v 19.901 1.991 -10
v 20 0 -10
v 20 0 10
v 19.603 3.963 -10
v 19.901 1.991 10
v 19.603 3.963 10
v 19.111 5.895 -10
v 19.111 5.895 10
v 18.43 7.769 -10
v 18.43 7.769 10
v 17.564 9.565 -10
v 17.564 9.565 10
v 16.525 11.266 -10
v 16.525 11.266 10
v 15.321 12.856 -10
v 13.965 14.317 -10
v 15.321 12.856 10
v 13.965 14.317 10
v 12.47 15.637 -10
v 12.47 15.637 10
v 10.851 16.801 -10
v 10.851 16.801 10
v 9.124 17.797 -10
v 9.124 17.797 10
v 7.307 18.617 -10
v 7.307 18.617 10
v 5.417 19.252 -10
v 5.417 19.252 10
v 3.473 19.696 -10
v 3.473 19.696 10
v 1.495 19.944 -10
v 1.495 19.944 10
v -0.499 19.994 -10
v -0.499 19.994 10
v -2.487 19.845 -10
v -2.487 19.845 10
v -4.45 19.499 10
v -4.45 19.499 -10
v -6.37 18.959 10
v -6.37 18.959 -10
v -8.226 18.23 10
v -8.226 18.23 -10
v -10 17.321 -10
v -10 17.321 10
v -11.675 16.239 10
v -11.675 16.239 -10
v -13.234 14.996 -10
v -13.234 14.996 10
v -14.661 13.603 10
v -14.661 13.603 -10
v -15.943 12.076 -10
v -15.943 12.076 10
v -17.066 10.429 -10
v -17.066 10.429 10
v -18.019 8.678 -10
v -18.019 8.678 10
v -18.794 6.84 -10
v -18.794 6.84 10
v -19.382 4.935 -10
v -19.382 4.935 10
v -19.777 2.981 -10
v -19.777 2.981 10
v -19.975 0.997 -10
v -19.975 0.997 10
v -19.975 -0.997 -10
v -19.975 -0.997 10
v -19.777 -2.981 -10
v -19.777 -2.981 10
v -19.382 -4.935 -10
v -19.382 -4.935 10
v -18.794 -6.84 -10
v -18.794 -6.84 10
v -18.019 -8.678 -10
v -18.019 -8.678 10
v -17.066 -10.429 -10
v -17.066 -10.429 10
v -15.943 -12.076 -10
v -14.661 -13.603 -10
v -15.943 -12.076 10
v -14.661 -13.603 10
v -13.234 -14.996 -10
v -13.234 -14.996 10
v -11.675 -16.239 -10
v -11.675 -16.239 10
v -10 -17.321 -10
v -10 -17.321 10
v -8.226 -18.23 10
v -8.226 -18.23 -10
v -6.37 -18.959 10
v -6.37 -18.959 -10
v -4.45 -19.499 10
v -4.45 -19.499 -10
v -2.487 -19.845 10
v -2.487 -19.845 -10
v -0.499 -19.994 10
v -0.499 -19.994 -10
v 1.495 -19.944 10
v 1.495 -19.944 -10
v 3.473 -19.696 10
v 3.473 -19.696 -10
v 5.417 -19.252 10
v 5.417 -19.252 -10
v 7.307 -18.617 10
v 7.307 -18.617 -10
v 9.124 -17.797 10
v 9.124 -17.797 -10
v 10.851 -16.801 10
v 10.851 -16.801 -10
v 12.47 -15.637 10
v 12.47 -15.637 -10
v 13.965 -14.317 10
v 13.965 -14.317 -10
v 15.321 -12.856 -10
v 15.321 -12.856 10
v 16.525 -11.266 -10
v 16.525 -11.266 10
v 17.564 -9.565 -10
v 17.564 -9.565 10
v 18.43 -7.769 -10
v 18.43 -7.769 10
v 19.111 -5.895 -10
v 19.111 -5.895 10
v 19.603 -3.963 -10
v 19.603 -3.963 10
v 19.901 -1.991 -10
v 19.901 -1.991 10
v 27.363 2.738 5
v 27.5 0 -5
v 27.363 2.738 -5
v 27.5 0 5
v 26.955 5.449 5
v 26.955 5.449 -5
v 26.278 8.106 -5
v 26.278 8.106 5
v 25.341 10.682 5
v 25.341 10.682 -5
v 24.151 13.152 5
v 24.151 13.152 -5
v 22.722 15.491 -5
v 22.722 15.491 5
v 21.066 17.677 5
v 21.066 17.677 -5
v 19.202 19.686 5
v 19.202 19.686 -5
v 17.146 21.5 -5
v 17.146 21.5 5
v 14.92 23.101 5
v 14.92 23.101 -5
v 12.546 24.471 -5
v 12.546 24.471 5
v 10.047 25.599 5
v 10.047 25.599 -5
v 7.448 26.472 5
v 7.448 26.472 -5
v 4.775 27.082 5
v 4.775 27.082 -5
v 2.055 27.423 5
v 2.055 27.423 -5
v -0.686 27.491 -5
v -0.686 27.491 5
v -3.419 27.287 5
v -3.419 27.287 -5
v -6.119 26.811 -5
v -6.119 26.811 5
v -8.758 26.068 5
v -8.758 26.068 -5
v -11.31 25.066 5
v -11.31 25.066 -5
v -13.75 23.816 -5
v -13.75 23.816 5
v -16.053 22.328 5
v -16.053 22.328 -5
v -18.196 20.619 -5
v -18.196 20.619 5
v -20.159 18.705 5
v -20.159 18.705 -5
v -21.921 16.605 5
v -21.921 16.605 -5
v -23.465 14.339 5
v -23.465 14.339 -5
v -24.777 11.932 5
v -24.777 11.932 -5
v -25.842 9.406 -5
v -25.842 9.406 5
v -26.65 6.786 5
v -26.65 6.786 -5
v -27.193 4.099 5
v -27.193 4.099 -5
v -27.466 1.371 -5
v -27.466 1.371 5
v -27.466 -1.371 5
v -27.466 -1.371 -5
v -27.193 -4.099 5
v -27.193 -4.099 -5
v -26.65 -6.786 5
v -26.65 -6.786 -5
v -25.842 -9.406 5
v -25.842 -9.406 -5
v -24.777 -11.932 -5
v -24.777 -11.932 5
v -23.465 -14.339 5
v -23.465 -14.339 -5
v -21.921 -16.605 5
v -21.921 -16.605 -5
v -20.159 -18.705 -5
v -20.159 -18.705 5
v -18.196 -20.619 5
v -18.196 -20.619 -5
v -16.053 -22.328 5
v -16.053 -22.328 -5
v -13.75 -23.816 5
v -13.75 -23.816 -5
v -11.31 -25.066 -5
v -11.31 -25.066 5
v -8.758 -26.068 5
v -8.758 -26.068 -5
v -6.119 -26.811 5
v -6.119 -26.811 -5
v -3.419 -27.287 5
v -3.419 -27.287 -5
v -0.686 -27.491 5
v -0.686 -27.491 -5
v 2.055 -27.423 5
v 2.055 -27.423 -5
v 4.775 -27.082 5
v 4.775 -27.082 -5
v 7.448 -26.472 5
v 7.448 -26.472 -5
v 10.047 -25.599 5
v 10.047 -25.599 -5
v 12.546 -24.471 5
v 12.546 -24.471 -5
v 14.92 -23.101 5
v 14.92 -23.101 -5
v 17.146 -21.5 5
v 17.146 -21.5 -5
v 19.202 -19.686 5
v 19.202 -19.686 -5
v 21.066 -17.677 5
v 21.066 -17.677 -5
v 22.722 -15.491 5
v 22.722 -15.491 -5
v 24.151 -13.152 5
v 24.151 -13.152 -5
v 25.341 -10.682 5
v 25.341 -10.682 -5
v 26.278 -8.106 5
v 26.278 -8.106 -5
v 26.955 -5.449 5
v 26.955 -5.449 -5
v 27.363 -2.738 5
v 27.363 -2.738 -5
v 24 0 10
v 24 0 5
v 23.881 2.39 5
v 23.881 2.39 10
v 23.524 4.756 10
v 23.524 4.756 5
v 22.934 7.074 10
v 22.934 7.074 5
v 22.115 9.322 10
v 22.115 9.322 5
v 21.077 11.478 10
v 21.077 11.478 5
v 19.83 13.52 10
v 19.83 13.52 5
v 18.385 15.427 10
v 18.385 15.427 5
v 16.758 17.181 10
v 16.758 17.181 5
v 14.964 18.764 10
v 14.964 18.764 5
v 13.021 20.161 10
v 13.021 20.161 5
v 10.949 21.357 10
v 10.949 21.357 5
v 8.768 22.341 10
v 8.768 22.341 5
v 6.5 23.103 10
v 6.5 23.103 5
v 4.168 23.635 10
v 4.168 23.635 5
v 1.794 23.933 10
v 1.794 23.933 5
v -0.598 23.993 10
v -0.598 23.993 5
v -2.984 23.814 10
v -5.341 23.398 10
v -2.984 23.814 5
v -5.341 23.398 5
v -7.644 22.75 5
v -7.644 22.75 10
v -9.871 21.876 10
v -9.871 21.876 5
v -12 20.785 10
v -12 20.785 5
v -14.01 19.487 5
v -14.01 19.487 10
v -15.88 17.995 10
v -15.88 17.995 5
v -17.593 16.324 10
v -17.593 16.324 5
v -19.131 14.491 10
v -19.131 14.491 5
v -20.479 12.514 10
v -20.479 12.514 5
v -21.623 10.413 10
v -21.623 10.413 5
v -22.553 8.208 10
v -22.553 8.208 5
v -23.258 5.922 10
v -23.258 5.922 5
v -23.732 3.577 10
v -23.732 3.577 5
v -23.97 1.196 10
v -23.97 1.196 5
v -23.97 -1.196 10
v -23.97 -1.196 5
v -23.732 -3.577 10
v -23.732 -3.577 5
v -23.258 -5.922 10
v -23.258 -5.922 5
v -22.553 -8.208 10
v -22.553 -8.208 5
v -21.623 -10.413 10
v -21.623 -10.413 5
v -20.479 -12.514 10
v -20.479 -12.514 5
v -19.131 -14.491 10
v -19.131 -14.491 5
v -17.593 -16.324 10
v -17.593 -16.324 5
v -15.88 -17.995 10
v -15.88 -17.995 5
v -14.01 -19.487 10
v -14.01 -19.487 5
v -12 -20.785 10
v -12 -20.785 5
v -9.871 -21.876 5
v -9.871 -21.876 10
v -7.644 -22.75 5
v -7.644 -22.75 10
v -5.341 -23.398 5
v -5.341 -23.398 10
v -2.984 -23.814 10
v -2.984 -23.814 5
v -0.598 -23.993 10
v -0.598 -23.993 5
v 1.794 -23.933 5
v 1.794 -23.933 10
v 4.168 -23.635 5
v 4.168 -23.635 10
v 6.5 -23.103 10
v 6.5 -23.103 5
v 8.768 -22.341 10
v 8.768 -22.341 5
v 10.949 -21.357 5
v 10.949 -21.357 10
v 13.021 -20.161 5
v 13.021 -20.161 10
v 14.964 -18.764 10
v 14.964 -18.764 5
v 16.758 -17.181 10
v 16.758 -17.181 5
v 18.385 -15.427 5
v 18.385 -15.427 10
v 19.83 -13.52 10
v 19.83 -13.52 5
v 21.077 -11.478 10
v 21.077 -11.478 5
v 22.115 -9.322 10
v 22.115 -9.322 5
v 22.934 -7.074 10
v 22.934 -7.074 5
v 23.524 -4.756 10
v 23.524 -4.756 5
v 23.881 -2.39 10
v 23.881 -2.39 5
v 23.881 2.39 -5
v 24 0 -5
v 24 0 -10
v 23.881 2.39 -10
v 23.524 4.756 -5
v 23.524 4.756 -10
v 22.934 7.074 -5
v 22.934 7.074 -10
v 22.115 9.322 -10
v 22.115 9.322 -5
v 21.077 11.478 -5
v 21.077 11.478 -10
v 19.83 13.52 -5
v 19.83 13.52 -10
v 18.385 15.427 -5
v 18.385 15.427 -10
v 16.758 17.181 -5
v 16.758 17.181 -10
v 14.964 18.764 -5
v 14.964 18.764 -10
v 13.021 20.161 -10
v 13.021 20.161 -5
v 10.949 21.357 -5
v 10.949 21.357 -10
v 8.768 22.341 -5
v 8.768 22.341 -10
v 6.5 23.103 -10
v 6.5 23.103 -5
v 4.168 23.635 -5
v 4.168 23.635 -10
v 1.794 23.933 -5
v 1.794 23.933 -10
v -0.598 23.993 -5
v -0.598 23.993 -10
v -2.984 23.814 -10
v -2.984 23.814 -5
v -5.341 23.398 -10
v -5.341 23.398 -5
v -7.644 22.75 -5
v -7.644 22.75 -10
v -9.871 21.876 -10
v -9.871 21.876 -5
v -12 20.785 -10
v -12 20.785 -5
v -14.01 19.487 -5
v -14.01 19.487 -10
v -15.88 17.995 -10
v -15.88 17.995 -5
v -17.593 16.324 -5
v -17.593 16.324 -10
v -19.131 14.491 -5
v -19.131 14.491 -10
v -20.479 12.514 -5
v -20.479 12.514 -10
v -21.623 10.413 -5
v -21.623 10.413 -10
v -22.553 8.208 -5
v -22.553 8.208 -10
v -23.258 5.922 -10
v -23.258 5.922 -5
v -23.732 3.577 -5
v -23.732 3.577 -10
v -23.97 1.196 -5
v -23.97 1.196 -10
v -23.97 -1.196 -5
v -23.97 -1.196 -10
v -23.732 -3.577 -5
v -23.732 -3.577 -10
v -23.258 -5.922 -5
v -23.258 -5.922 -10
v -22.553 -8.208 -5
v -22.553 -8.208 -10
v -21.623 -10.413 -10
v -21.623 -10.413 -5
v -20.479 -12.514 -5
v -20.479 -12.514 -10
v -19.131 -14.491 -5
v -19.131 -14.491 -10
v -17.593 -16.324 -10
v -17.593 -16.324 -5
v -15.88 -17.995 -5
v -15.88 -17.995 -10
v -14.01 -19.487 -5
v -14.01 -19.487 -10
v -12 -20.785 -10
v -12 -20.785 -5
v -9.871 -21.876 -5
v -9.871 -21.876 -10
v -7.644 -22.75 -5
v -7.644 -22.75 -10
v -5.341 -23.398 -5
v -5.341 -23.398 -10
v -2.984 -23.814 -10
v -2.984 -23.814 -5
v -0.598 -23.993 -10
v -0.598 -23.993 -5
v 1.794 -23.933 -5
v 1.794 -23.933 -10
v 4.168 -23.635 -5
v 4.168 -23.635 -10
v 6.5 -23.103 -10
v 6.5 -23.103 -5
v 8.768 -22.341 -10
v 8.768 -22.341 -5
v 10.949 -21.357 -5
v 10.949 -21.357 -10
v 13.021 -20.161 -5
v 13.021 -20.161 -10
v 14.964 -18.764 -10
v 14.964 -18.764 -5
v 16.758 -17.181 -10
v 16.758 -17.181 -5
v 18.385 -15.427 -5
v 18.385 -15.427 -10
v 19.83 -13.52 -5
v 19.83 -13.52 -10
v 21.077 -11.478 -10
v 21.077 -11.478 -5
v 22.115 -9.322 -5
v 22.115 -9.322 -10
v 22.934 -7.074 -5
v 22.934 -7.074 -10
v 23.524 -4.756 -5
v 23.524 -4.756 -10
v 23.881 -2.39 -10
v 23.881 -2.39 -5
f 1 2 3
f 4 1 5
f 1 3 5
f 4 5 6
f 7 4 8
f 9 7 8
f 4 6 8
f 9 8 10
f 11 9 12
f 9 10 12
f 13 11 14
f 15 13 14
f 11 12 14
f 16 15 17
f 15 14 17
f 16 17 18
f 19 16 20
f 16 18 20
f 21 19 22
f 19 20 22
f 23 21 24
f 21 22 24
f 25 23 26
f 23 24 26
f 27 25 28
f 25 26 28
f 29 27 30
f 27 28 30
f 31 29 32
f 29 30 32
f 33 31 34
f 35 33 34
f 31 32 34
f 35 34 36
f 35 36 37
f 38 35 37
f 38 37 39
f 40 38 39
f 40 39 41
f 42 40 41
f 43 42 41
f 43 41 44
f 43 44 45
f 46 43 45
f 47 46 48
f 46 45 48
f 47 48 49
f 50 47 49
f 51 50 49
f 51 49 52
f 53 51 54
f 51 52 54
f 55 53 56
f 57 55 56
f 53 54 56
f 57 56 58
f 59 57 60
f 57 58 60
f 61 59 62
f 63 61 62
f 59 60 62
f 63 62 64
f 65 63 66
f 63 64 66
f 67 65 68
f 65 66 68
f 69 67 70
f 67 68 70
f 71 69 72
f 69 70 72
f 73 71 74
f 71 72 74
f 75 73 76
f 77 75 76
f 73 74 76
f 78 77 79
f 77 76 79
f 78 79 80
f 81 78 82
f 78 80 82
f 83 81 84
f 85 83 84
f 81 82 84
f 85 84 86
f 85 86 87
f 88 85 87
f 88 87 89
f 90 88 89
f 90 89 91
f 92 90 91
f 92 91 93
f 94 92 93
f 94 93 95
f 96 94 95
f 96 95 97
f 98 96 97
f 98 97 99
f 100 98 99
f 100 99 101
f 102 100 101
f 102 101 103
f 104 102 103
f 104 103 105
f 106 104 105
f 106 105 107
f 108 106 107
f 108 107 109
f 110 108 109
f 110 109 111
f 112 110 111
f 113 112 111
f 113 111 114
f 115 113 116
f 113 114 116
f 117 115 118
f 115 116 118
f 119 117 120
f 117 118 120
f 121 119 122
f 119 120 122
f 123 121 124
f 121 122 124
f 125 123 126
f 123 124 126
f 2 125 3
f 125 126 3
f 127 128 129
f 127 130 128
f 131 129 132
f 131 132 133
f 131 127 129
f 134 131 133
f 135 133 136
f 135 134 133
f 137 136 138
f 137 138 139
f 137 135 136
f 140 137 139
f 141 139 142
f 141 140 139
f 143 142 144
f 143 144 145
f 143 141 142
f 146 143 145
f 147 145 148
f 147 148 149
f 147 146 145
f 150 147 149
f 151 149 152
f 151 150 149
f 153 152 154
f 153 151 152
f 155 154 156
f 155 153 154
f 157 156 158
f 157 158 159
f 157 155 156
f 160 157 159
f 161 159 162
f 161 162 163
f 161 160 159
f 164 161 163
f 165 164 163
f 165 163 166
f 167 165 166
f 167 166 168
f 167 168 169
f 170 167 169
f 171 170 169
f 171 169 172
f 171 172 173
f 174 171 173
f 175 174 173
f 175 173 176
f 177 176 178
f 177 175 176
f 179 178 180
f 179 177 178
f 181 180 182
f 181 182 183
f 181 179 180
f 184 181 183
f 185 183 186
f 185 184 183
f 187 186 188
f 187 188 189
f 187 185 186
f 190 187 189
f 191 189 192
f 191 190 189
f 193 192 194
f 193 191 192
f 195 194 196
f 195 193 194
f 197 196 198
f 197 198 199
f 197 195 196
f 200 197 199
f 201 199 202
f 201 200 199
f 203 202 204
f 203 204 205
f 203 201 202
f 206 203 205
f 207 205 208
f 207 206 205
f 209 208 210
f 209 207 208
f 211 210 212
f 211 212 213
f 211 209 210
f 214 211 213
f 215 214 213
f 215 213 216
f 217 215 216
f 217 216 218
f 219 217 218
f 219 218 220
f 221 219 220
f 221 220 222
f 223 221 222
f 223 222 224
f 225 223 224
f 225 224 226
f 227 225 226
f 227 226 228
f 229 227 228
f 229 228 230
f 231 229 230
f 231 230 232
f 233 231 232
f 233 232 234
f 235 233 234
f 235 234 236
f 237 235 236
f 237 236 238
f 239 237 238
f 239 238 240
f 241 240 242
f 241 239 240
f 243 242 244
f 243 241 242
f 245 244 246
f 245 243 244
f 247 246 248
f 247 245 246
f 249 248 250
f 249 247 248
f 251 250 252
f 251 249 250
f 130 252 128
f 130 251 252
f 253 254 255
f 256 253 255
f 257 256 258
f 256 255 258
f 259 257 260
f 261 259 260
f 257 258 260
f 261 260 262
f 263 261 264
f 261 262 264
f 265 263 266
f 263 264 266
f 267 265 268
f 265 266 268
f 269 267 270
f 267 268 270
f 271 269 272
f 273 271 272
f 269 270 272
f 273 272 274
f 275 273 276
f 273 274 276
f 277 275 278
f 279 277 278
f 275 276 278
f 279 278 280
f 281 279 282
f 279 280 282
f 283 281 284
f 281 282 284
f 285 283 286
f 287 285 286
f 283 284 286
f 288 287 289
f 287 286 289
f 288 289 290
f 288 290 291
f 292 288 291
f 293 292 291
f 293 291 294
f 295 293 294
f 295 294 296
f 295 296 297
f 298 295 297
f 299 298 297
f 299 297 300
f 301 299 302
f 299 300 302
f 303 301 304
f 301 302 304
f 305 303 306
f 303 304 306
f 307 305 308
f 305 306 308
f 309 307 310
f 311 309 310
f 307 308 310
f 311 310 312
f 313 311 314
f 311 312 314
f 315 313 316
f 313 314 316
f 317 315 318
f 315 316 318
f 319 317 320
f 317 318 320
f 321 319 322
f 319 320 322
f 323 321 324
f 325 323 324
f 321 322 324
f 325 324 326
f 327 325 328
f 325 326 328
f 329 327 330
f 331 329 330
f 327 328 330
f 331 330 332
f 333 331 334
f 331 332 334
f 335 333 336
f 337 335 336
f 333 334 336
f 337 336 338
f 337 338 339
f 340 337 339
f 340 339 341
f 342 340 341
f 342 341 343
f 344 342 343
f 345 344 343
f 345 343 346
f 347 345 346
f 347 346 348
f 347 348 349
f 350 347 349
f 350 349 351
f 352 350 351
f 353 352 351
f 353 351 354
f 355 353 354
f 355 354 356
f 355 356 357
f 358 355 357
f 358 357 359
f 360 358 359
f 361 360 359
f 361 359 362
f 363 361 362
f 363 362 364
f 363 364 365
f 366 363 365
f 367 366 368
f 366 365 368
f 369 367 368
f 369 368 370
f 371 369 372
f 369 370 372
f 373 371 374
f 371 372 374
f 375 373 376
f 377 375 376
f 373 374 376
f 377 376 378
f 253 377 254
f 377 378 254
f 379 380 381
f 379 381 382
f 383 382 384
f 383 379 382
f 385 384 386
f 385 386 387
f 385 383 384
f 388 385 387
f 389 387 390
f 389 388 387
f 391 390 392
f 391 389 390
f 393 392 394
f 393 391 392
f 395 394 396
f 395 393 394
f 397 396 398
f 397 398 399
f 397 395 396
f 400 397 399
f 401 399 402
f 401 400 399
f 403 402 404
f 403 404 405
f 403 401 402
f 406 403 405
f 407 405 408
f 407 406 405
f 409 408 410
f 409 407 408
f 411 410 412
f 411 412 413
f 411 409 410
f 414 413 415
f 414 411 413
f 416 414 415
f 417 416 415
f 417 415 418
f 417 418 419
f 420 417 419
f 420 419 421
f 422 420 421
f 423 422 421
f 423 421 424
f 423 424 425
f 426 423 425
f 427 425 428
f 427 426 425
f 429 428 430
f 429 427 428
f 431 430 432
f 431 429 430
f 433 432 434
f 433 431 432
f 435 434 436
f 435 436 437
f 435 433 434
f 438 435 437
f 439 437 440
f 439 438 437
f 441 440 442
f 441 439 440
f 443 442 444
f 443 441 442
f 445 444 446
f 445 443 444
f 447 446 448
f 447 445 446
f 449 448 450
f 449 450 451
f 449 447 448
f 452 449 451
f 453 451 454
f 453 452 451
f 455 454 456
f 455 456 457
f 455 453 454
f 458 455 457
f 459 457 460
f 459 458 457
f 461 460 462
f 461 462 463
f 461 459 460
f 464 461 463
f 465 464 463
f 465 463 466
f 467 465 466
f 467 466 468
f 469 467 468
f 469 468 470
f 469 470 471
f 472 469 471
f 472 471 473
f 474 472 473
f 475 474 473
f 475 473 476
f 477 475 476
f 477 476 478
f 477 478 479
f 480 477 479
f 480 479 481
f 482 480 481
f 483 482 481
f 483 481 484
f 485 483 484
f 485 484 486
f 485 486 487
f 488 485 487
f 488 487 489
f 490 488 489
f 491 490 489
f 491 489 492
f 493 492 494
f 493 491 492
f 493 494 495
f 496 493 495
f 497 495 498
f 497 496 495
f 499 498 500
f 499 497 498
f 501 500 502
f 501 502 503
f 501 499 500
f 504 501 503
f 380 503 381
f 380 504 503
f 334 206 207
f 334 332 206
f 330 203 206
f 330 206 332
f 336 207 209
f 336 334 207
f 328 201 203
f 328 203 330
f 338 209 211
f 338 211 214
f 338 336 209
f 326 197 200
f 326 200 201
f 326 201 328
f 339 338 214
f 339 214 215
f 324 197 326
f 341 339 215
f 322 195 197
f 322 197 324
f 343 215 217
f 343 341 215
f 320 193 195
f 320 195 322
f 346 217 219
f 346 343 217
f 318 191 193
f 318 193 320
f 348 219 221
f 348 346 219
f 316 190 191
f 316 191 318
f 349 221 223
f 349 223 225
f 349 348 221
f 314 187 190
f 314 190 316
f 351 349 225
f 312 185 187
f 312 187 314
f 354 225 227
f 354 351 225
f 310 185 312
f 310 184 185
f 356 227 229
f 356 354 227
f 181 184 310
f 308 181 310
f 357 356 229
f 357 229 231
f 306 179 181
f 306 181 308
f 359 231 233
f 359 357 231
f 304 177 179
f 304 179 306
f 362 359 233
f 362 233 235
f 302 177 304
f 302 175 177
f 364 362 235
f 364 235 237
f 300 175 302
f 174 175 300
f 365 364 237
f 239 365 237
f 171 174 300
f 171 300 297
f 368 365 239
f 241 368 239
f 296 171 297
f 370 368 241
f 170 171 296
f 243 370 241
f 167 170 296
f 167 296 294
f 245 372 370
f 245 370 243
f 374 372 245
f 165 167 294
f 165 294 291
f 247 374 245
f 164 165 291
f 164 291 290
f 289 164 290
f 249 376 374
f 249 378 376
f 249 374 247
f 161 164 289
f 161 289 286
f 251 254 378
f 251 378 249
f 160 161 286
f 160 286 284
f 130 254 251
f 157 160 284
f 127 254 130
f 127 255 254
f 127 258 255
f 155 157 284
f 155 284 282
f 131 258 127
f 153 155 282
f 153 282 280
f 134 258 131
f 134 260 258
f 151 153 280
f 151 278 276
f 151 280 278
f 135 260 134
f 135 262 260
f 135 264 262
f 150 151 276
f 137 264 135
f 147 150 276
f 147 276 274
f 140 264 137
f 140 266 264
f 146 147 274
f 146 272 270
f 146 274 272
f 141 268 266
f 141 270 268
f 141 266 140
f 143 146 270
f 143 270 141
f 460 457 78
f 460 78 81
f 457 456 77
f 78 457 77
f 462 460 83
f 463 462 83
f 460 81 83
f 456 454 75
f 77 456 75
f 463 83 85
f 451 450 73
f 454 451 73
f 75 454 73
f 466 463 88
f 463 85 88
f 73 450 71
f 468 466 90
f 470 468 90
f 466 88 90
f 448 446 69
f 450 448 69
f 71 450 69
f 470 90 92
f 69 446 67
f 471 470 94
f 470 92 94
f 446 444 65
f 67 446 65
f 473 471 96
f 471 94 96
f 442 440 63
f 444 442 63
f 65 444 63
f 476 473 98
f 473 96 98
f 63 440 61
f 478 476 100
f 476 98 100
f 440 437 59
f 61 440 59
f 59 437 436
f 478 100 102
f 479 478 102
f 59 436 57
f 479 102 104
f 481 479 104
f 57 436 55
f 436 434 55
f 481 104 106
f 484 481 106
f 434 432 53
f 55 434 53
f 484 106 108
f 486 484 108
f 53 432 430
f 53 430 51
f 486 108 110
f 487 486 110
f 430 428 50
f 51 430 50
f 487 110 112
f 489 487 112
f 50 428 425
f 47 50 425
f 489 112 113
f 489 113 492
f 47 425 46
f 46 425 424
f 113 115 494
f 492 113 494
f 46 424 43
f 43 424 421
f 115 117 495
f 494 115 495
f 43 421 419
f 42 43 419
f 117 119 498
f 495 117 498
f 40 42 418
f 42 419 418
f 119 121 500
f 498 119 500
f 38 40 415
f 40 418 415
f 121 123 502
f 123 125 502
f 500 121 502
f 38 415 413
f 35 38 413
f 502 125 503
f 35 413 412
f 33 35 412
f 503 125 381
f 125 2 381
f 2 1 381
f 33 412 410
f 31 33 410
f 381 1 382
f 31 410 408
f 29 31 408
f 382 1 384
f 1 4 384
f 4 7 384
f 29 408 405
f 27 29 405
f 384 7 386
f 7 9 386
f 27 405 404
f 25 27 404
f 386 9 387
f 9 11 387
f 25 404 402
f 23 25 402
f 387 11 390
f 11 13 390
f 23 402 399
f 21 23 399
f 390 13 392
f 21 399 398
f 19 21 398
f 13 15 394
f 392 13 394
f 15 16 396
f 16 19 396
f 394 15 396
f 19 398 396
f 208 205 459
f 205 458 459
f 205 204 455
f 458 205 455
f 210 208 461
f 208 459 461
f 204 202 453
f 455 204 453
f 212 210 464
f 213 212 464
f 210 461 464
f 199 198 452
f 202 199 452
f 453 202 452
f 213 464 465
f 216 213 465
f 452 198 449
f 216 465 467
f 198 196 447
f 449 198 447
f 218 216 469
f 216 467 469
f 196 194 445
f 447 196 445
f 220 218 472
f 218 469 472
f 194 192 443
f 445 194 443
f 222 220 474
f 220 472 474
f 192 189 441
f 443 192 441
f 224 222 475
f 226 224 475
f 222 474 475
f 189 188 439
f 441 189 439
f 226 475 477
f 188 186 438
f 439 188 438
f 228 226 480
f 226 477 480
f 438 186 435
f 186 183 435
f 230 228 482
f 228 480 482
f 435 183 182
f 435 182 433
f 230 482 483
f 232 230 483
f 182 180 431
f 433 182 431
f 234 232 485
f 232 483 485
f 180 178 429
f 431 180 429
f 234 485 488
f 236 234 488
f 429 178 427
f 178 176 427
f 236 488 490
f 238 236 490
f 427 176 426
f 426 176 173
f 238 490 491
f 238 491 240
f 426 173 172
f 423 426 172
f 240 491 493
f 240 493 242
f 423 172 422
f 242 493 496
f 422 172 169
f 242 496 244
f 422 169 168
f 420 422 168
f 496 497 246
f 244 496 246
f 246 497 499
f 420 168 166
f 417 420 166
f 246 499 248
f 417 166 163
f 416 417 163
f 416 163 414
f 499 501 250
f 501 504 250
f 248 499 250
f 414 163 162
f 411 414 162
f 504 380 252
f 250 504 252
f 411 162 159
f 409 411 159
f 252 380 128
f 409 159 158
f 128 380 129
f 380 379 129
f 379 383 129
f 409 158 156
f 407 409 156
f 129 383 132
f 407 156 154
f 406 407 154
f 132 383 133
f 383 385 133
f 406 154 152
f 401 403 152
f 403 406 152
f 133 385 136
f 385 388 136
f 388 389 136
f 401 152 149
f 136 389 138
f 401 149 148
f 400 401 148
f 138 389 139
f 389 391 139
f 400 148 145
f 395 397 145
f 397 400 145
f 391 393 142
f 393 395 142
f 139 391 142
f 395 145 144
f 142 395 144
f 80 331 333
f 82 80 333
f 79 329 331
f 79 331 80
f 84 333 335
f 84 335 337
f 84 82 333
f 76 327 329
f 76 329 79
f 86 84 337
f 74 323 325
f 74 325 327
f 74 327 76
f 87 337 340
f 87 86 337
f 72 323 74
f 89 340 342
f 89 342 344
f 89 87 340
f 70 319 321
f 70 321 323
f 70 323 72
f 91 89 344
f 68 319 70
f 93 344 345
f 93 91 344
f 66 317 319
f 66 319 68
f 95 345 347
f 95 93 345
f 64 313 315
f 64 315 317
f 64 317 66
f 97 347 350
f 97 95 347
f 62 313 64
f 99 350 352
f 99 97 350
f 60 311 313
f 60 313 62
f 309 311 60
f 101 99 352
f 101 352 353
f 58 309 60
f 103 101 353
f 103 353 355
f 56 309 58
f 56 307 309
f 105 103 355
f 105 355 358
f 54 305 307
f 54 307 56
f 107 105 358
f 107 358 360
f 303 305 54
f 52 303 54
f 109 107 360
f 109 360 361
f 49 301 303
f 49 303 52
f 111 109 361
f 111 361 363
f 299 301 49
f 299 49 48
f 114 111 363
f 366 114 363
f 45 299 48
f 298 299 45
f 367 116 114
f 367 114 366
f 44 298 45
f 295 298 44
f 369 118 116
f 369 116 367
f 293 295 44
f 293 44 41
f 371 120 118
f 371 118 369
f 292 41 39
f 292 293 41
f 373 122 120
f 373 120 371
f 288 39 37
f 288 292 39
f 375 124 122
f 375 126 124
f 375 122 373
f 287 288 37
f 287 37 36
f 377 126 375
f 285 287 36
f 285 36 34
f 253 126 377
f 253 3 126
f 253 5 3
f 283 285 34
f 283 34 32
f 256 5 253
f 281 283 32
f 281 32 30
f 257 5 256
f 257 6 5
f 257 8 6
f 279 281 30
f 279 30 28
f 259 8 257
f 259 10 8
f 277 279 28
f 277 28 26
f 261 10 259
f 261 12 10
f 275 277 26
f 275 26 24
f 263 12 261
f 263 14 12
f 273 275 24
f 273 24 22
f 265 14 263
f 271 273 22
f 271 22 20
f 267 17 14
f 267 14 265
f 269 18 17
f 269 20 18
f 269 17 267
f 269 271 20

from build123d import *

# Parameters (mm, degrees)
SKETCH1_R           = 27.5
SKETCH1_R_2         = 20
BOSS_EXTRUDE1_DEPTH = 5
SKETCH2_R           = 24
SKETCH2_R_2         = 20
BOSS_EXTRUDE2_DEPTH = 5


with BuildPart() as part:
    # Sketch1 → Boss-Extrude1 (new, symmetric)
    with BuildSketch(Plane.XY):
        Circle(SKETCH1_R)
        Circle(SKETCH1_R_2, mode=Mode.SUBTRACT)
    extrude(amount=BOSS_EXTRUDE1_DEPTH, both=True)

    # Sketch2 → Boss-Extrude2 (add)
    with BuildSketch(Plane.XY.offset(5)):
        Circle(SKETCH2_R)
        Circle(SKETCH2_R_2, mode=Mode.SUBTRACT)
    boss_extrude2 = extrude(amount=BOSS_EXTRUDE2_DEPTH)

    # Mirror1: Boss-Extrude2 across plane
    add(boss_extrude2.mirror(Plane.XY))


solid = part.part
